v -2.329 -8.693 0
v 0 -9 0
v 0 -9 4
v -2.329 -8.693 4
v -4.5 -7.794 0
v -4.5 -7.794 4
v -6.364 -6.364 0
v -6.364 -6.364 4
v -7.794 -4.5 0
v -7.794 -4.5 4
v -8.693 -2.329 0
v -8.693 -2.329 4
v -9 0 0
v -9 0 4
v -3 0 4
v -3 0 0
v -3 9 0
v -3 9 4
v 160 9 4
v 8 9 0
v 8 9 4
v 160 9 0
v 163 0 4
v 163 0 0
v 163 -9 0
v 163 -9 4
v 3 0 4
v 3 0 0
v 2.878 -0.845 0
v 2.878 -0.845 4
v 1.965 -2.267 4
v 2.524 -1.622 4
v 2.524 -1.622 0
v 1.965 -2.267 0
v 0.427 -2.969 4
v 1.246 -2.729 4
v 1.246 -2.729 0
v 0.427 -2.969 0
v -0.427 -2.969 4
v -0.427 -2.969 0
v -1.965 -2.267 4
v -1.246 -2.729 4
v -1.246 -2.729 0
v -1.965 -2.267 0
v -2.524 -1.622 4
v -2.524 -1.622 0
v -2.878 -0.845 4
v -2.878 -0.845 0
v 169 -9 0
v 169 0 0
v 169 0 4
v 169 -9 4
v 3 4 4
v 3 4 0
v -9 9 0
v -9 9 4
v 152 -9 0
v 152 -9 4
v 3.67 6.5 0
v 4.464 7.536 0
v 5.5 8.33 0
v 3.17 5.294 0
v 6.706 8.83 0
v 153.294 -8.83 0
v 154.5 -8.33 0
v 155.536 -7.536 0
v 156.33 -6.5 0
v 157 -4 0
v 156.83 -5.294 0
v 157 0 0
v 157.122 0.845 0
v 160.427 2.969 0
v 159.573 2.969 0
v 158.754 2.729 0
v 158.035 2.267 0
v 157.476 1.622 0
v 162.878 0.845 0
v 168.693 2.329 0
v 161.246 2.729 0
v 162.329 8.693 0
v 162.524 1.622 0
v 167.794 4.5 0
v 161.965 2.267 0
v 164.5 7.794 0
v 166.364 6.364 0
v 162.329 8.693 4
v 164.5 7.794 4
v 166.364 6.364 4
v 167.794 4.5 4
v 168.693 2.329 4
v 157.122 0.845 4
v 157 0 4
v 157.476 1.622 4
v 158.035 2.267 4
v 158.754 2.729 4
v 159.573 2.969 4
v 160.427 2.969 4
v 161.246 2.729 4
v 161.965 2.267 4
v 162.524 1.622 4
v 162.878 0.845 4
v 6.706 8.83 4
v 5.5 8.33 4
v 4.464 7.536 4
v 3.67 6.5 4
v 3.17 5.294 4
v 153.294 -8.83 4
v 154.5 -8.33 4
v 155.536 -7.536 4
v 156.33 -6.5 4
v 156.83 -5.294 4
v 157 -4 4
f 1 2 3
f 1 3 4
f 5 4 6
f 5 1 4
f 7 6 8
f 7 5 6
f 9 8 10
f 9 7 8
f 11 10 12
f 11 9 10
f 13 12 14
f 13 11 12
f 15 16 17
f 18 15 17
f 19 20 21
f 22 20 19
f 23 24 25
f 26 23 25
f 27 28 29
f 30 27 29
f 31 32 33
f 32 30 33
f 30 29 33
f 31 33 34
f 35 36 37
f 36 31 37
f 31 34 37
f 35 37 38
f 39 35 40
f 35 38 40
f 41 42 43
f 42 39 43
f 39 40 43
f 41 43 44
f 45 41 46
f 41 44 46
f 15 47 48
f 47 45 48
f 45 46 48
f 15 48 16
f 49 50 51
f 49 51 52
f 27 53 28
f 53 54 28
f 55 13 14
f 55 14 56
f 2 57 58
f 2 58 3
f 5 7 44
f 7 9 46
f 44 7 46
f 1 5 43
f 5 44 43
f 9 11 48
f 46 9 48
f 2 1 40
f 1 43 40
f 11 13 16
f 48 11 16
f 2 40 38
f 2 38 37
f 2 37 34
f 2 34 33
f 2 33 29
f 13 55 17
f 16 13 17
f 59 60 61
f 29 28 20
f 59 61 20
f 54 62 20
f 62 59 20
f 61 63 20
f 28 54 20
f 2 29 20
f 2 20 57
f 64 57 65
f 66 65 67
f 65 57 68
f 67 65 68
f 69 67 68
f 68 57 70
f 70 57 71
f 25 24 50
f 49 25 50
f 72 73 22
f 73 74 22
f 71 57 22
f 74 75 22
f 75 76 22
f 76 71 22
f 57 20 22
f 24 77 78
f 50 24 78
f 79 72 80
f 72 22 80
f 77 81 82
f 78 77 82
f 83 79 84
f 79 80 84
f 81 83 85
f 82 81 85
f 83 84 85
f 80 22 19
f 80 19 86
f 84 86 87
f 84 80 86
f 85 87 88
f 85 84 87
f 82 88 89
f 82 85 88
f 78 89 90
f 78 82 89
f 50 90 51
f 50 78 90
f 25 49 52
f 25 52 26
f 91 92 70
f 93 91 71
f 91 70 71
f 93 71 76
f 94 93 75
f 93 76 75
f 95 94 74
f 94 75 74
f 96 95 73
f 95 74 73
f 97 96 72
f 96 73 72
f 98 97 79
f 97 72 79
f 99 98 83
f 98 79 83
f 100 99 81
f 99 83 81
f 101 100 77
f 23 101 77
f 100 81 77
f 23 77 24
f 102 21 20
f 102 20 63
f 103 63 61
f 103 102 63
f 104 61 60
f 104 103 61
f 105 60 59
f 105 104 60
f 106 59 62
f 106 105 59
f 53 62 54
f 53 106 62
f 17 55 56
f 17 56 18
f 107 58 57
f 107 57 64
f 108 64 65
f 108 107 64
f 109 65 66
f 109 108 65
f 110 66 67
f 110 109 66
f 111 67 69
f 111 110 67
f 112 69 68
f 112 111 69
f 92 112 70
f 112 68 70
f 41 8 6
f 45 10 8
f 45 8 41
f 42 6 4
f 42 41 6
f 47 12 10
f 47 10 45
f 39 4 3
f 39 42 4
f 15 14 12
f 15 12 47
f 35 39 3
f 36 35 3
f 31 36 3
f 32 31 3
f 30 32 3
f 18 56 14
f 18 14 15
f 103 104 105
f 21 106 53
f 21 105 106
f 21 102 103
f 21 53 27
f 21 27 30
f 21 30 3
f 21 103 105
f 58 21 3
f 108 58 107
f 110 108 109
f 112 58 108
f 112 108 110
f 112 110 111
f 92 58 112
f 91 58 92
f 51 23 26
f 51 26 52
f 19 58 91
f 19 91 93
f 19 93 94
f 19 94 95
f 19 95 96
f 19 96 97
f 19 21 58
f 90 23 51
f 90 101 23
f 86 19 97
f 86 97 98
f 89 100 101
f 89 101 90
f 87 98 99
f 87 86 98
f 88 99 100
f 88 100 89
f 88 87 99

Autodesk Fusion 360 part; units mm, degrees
sketch "Sketch1" plane through (0, 0, 0) normal (0, 0, 1) x (1, 0, 0)
  line L0 (0, 0) -> (160, 0)
  circle A0 centre (0, 0) radius 3
  circle A1 centre (160, 0) radius 3
  circle A2 centre (0, 0) radius 9
  circle A3 centre (160, 0) radius 9
  line L1 (-9, 9) -> (169, 9)
  line L2 (169, 9) -> (169, -9)
  line L3 (169, -9) -> (-9, -9)
  line L4 (-9, -9) -> (-9, 9)
  line L5 (-3, 9) -> (3, 9)
  line L6 (3, 9) -> (3, -3)
  line L7 (3, -3) -> (-3, -3)
  line L8 (-3, -3) -> (-3, 9)
  line L9 (157, 3) -> (163, 3)
  line L10 (163, 3) -> (163, -9)
  line L11 (163, -9) -> (157, -9)
  line L12 (157, -9) -> (157, 3)
  dimension "d1" = 160
  dimension "d2" = 6
  dimension "d3" = 6
  dimension "d4" = 18
  dimension "d5" = 18
extrude "Extrude1" add sketch "Sketch1" along normal blind 4 contours L0 A2 L6 | A0 L6 L7 | L0 A2 L6 L7 L8 | L0 A2 A3 L1 L6 | L0 A2 A3 L3 L12 | A0 L7 L8 | L0 A3 L9 L10 L12 | L0 A3 L12 | A2 L1 L4 L8 | A1 L9 L12 | A1 L9 L10 | A3 L2 L3 L10
fillet "Fillet1" radius 5 2 edges at (157, -9, 2) (3, 9, 2)
